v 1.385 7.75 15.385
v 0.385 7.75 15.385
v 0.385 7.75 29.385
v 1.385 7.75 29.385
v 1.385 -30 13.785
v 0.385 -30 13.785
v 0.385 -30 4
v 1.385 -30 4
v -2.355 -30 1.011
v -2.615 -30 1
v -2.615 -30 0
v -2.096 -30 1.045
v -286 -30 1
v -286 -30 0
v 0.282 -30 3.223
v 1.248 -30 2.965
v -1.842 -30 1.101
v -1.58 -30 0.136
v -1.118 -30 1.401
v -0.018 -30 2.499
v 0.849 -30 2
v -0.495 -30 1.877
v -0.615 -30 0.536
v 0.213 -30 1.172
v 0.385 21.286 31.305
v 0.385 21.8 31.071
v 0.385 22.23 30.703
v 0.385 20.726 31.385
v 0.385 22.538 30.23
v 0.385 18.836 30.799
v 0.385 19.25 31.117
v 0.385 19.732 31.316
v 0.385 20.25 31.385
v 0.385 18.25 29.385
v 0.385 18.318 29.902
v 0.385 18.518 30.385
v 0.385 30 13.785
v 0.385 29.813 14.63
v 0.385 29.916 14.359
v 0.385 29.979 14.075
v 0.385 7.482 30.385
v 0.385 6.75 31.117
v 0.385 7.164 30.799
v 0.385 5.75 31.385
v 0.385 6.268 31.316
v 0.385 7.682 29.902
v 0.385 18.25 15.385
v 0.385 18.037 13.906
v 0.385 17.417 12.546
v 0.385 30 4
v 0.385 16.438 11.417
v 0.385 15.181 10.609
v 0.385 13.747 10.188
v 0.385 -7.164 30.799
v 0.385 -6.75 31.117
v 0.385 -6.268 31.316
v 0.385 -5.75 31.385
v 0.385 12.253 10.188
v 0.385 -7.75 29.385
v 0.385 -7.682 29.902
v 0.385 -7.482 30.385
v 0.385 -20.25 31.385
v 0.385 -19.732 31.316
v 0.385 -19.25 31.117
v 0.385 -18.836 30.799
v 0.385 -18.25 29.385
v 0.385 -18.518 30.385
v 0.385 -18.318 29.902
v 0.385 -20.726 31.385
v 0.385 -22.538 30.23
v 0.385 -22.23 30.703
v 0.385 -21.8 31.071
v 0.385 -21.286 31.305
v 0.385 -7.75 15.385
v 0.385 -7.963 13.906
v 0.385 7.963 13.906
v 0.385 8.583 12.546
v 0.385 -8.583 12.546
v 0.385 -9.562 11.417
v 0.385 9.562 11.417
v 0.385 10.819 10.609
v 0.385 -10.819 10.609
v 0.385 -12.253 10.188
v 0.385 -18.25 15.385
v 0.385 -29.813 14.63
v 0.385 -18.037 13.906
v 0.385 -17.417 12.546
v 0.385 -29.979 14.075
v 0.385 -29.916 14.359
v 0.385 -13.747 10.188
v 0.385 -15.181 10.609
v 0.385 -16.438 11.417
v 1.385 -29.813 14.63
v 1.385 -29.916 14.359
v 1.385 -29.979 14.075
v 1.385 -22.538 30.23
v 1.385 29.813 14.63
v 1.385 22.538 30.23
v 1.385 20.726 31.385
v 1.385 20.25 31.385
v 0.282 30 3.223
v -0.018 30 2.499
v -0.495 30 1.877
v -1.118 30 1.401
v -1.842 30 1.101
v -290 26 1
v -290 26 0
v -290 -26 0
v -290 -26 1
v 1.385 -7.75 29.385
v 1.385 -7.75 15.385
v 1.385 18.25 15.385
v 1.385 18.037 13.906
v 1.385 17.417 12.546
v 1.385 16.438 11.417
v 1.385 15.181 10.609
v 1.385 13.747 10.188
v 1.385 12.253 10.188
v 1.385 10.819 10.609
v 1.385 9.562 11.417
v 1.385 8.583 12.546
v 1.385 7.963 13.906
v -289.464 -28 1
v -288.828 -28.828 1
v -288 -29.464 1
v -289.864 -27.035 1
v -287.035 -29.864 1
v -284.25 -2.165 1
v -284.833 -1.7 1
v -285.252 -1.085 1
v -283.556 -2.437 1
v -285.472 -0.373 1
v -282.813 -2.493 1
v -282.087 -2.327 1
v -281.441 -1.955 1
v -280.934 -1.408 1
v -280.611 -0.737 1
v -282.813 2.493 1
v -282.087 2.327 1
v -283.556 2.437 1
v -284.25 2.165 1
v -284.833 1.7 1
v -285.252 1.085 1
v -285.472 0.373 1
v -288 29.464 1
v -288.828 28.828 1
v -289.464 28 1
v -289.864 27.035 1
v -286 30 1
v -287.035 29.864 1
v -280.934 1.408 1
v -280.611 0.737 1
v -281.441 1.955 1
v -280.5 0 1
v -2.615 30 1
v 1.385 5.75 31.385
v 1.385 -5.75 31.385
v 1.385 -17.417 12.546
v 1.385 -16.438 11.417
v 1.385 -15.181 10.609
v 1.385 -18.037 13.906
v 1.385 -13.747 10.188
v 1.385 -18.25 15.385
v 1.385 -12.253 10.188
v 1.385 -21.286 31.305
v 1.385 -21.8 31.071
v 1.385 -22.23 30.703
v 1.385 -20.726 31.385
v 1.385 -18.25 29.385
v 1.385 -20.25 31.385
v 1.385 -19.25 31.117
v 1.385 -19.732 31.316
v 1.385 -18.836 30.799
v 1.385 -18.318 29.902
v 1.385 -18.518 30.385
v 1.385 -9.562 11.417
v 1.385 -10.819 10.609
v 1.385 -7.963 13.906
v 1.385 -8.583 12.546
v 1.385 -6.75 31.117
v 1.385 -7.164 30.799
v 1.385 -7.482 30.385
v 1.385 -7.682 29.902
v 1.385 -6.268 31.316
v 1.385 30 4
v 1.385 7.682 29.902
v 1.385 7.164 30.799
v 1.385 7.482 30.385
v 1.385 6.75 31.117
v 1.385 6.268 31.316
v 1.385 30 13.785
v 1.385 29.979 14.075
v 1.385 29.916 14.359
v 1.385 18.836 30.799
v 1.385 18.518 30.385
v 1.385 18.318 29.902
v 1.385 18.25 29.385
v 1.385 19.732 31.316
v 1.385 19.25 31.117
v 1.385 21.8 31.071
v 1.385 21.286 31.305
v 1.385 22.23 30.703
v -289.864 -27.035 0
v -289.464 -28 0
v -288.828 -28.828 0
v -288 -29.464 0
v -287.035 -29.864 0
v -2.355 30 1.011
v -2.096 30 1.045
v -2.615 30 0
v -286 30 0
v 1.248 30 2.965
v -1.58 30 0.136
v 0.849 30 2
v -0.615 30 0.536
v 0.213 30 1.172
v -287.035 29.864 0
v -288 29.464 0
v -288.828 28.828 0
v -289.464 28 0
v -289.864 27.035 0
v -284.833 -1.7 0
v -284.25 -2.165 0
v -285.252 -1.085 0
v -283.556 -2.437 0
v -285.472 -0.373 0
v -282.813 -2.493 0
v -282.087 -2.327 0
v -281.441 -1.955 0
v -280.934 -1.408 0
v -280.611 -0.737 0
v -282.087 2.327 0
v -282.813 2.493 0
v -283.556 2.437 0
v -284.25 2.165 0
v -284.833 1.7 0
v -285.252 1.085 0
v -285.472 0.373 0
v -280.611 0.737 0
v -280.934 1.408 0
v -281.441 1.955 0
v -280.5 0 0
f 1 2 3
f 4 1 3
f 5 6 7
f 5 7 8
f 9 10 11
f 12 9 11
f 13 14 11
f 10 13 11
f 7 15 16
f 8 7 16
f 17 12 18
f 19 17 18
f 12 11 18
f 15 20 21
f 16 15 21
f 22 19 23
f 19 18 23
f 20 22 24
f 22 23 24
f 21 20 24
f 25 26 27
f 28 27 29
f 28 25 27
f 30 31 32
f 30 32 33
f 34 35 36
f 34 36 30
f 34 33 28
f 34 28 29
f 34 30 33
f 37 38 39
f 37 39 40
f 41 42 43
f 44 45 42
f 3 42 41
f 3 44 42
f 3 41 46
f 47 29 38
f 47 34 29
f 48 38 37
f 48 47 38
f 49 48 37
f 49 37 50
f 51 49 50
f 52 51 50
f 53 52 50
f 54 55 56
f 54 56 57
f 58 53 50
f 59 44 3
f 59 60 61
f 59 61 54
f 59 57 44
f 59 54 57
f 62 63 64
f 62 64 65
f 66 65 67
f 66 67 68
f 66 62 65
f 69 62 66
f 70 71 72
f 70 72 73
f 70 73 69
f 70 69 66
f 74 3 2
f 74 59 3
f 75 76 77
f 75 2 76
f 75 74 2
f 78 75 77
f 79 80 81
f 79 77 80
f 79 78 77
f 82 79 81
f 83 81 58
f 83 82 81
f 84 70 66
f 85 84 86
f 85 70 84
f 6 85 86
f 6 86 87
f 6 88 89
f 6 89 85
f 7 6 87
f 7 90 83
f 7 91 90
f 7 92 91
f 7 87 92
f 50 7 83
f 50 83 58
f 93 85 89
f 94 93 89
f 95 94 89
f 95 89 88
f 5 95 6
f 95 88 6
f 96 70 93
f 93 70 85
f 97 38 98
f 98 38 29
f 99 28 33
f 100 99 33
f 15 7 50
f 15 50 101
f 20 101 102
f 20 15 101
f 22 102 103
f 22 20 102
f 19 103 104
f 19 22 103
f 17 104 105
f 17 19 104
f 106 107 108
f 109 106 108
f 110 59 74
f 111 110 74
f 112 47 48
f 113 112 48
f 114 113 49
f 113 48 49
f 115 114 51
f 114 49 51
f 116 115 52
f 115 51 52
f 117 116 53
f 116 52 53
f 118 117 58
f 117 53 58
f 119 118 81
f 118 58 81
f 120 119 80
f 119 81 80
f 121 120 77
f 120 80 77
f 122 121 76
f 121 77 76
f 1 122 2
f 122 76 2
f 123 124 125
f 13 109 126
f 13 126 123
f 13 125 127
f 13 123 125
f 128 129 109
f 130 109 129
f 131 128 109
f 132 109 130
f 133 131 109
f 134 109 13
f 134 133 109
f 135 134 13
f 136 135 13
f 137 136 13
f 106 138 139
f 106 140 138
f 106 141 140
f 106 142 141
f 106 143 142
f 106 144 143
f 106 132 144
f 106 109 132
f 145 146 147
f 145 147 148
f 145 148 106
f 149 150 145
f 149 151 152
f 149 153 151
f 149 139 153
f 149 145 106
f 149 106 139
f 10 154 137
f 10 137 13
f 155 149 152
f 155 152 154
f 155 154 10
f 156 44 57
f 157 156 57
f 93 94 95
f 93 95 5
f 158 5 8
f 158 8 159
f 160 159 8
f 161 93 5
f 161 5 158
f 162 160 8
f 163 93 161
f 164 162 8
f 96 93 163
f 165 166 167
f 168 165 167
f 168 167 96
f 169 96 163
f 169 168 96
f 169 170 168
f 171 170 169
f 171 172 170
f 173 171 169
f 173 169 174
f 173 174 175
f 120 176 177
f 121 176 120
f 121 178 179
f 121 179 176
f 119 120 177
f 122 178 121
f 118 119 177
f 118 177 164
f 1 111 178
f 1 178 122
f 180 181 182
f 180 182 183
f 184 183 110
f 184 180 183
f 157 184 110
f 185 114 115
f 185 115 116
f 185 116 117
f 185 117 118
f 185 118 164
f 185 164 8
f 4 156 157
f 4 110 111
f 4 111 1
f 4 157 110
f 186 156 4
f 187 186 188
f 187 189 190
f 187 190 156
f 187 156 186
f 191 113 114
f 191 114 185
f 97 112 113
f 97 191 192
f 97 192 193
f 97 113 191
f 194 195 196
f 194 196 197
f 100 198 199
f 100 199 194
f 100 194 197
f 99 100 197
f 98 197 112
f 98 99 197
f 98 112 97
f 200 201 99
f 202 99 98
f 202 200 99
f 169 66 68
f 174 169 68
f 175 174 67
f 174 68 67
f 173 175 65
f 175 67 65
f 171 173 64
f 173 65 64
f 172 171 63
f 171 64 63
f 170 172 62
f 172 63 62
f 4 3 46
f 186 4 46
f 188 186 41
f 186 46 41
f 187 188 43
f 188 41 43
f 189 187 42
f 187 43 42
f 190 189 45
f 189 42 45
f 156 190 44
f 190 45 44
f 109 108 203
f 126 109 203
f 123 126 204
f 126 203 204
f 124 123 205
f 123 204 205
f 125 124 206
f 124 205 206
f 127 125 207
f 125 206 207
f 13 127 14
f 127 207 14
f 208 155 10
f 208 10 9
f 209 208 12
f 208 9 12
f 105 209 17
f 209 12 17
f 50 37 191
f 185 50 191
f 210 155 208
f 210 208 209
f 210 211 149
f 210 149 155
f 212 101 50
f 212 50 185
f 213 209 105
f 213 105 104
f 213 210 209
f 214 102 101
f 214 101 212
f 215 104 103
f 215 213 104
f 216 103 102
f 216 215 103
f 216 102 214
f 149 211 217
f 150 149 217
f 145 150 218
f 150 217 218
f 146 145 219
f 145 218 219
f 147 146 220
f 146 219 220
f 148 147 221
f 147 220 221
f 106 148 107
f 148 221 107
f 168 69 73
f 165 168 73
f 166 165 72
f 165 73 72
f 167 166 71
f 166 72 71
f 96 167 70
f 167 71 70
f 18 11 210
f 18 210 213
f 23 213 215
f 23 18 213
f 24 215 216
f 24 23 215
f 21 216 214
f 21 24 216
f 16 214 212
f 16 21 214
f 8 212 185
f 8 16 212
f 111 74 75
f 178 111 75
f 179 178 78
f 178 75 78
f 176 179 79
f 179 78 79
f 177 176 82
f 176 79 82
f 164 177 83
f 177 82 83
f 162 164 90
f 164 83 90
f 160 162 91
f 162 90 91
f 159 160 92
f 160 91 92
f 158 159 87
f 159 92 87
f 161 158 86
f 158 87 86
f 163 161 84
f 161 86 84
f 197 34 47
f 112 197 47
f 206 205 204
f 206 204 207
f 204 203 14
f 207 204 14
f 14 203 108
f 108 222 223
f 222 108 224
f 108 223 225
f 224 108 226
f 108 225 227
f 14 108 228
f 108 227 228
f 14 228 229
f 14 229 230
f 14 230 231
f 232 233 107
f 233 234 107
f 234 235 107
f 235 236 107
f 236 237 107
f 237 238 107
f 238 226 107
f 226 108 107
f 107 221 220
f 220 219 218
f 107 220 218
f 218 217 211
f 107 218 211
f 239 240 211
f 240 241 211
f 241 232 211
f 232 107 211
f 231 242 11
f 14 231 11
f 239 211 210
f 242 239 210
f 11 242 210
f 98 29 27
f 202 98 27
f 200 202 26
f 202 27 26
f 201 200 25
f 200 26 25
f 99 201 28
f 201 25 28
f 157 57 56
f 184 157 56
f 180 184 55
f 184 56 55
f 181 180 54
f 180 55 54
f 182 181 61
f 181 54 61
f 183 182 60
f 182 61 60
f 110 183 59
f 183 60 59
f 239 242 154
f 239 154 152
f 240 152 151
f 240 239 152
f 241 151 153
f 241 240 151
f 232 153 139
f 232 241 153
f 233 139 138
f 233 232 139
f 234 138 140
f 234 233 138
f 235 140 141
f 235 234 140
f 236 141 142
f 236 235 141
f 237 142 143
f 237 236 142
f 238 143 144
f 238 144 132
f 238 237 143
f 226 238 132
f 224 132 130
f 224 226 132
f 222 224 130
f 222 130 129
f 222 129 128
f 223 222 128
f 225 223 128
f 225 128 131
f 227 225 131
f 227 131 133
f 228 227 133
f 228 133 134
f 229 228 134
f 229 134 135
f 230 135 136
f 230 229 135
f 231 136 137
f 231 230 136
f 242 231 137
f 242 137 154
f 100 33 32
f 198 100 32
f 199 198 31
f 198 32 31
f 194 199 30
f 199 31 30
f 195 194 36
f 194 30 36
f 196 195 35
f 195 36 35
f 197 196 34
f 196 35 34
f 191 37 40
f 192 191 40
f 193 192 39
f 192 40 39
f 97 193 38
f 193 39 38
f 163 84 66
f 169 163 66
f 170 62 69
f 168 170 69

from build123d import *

# Parameters (mm, degrees)
SKETCH1_R                = 2.5
BASE_EXTRUDE_DEPTH       = 1
PROCESS_BENDS1_START     = 0.384624116
PROCESS_BENDS1_OUTLINE_W = 60
PROCESS_BENDS1_OUTLINE_H = 1
PROCESS_BENDS1_DEPTH     = 29.615375884
PROCESS_BENDS1_START_2   = -1.84192973
PROCESS_BENDS1_2_DEPTH   = 3.226553846
PROCESS_BENDS1_START_3   = -30
PROCESS_BENDS1_3_DEPTH   = 61
PROCESS_BENDS1_4_DEPTH   = 60


with BuildPart() as part:
    # Sketch1 → Base-Extrude (new body)
    with BuildSketch(Plane.XY):
        with BuildLine():
            Line((14, 18.25), (28, 18.25))
            ThreePointArc((28, 18.25), (29.414213562, 18.835786438), (30, 20.25))
            Line((30, 20.25), (30, 20.725859478))
            ThreePointArc((30, 20.725859478), (29.686782892, 21.800458695), (28.845236523, 22.538475052))
            Line((28.845236523, 22.538475052), (13.245791834, 29.812615574))
            ThreePointArc((13.245791834, 29.812615574), (12.833434539, 29.952592014), (12.400555311, 30))
            Line((12.400555311, 30), (-286, 30))
            ThreePointArc((-286, 30), (-288.828427125, 28.828427125), (-290, 26))
            Line((-290, 26), (-290, -26))
            ThreePointArc((-290, -26), (-288.828427125, -28.828427125), (-286, -30))
            Line((-286, -30), (12.400555311, -30))
            ThreePointArc((12.400555311, -30), (12.833434539, -29.952592014), (13.245791834, -29.812615574))
            Line((13.245791834, -29.812615574), (28.845236523, -22.538475052))
            ThreePointArc((28.845236523, -22.538475052), (29.686782892, -21.800458695), (30, -20.725859478))
            Line((30, -20.725859478), (30, -20.25))
            ThreePointArc((30, -20.25), (29.414213562, -18.835786438), (28, -18.25))
            Line((28, -18.25), (14, -18.25))
            ThreePointArc((14, -18.25), (8.75, -13), (14, -7.75))
            Line((14, -7.75), (28, -7.75))
            ThreePointArc((28, -7.75), (29.414213562, -7.164213562), (30, -5.75))
            Line((30, -5.75), (30, 5.75))
            ThreePointArc((30, 5.75), (29.414213562, 7.164213562), (28, 7.75))
            Line((28, 7.75), (14, 7.75))
            ThreePointArc((14, 7.75), (8.75, 13), (14, 18.25))
        make_face()
        with Locations((-283, 0)):
            Circle(SKETCH1_R, mode=Mode.SUBTRACT)
    extrude(amount=BASE_EXTRUDE_DEPTH)

    # Process-Bends1: read off the stored shape, not the designer's step
    # Process-Bends1 outline → Process-Bends1 (cut)
    with BuildSketch(Plane.YZ.offset(PROCESS_BENDS1_START)):
        with Locations((0, 0.5)):
            Rectangle(PROCESS_BENDS1_OUTLINE_W, PROCESS_BENDS1_OUTLINE_H)
    extrude(amount=PROCESS_BENDS1_DEPTH, mode=Mode.SUBTRACT)

    # Process-Bends1 2 outline → Process-Bends1 2 (add)
    with BuildSketch(Plane.YZ.offset(PROCESS_BENDS1_START_2)):
        with BuildLine():
            ThreePointArc((18.25, 15.384624116), (13, 10.134624116), (7.75, 15.384624116))
            Line((7.75, 15.384624116), (7.75, 29.384624116))
            ThreePointArc((7.75, 29.384624116), (7.164213562, 30.798837678), (5.75, 31.384624116))
            Line((5.75, 31.384624116), (-5.75, 31.384624116))
            ThreePointArc((-5.75, 31.384624116), (-7.164213562, 30.798837678), (-7.75, 29.384624116))
            Line((-7.75, 29.384624116), (-7.75, 15.384624116))
            ThreePointArc((-7.75, 15.384624116), (-13, 10.134624116), (-18.25, 15.384624116))
            Line((-18.25, 15.384624116), (-18.25, 29.384624116))
            ThreePointArc((-18.25, 29.384624116), (-18.835786438, 30.798837678), (-20.25, 31.384624116))
            Line((-20.25, 31.384624116), (-20.725859478, 31.384624116))
            ThreePointArc((-20.725859478, 31.384624116), (-21.800458695, 31.071407008), (-22.538475052, 30.229860639))
            Line((-22.538475052, 30.229860639), (-29.812615574, 14.63041595))
            ThreePointArc((-29.812615574, 14.63041595), (-29.952592014, 14.218058655), (-30, 13.785179427))
            Line((-30, 13.785179427), (-30, 1))
            Line((-30, 1), (30, 1))
            Line((30, 1), (30, 13.785179427))
            ThreePointArc((30, 13.785179427), (29.952592014, 14.218058655), (29.812615574, 14.63041595))
            Line((29.812615574, 14.63041595), (22.538475052, 30.229860639))
            ThreePointArc((22.538475052, 30.229860639), (21.800458695, 31.071407008), (20.725859478, 31.384624116))
            Line((20.725859478, 31.384624116), (20.25, 31.384624116))
            ThreePointArc((20.25, 31.384624116), (18.835786438, 30.798837678), (18.25, 29.384624116))
            Line((18.25, 29.384624116), (18.25, 15.384624116))
        make_face()
    extrude(amount=PROCESS_BENDS1_2_DEPTH)

    # Process-Bends1 3 outline → Process-Bends1 3 (cut)
    with BuildSketch(Plane(origin=(0, 0, 0), x_dir=(1, 0, 0), z_dir=(0, 1, 0)).offset(PROCESS_BENDS1_START_3)):
        with BuildLine():
            ThreePointArc((-2.615375884, 0), (0.213051241, -1.171572875), (1.384624116, -4))
            Line((1.384624116, -4), (1.384624116, -1))
            Line((1.384624116, -1), (0.384624116, -1))
            Line((0.384624116, -1), (0.384624116, 0))
            Line((0.384624116, 0), (-2.615375884, 0))
        make_face()
        with BuildLine():
            Line((0.384624116, -31.384624116), (0.384624116, -4))
            ThreePointArc((0.384624116, -4), (-0.236264867, -2.172479612), (-1.84192973, -1.101417407))
            Line((-1.84192973, -1.101417407), (-1.84192973, -31.384624116))
            Line((-1.84192973, -31.384624116), (0.384624116, -31.384624116))
        make_face()
    extrude(amount=PROCESS_BENDS1_3_DEPTH, mode=Mode.SUBTRACT)

    # Process-Bends1 4 outline → Process-Bends1 4 (add)
    with BuildSketch(Plane(origin=(0, 0, 0), x_dir=(1, 0, 0), z_dir=(0, 1, 0)).offset(PROCESS_BENDS1_START_3)):
        with BuildLine():
            ThreePointArc((-2.615375884, -1), (-2.22534241, -1.025462408), (-1.84192973, -1.101417407))
            Line((-1.84192973, -1.101417407), (-1.84192973, -1))
            Line((-1.84192973, -1), (-2.615375884, -1))
        make_face()
    extrude(amount=PROCESS_BENDS1_4_DEPTH)


solid = part.part
